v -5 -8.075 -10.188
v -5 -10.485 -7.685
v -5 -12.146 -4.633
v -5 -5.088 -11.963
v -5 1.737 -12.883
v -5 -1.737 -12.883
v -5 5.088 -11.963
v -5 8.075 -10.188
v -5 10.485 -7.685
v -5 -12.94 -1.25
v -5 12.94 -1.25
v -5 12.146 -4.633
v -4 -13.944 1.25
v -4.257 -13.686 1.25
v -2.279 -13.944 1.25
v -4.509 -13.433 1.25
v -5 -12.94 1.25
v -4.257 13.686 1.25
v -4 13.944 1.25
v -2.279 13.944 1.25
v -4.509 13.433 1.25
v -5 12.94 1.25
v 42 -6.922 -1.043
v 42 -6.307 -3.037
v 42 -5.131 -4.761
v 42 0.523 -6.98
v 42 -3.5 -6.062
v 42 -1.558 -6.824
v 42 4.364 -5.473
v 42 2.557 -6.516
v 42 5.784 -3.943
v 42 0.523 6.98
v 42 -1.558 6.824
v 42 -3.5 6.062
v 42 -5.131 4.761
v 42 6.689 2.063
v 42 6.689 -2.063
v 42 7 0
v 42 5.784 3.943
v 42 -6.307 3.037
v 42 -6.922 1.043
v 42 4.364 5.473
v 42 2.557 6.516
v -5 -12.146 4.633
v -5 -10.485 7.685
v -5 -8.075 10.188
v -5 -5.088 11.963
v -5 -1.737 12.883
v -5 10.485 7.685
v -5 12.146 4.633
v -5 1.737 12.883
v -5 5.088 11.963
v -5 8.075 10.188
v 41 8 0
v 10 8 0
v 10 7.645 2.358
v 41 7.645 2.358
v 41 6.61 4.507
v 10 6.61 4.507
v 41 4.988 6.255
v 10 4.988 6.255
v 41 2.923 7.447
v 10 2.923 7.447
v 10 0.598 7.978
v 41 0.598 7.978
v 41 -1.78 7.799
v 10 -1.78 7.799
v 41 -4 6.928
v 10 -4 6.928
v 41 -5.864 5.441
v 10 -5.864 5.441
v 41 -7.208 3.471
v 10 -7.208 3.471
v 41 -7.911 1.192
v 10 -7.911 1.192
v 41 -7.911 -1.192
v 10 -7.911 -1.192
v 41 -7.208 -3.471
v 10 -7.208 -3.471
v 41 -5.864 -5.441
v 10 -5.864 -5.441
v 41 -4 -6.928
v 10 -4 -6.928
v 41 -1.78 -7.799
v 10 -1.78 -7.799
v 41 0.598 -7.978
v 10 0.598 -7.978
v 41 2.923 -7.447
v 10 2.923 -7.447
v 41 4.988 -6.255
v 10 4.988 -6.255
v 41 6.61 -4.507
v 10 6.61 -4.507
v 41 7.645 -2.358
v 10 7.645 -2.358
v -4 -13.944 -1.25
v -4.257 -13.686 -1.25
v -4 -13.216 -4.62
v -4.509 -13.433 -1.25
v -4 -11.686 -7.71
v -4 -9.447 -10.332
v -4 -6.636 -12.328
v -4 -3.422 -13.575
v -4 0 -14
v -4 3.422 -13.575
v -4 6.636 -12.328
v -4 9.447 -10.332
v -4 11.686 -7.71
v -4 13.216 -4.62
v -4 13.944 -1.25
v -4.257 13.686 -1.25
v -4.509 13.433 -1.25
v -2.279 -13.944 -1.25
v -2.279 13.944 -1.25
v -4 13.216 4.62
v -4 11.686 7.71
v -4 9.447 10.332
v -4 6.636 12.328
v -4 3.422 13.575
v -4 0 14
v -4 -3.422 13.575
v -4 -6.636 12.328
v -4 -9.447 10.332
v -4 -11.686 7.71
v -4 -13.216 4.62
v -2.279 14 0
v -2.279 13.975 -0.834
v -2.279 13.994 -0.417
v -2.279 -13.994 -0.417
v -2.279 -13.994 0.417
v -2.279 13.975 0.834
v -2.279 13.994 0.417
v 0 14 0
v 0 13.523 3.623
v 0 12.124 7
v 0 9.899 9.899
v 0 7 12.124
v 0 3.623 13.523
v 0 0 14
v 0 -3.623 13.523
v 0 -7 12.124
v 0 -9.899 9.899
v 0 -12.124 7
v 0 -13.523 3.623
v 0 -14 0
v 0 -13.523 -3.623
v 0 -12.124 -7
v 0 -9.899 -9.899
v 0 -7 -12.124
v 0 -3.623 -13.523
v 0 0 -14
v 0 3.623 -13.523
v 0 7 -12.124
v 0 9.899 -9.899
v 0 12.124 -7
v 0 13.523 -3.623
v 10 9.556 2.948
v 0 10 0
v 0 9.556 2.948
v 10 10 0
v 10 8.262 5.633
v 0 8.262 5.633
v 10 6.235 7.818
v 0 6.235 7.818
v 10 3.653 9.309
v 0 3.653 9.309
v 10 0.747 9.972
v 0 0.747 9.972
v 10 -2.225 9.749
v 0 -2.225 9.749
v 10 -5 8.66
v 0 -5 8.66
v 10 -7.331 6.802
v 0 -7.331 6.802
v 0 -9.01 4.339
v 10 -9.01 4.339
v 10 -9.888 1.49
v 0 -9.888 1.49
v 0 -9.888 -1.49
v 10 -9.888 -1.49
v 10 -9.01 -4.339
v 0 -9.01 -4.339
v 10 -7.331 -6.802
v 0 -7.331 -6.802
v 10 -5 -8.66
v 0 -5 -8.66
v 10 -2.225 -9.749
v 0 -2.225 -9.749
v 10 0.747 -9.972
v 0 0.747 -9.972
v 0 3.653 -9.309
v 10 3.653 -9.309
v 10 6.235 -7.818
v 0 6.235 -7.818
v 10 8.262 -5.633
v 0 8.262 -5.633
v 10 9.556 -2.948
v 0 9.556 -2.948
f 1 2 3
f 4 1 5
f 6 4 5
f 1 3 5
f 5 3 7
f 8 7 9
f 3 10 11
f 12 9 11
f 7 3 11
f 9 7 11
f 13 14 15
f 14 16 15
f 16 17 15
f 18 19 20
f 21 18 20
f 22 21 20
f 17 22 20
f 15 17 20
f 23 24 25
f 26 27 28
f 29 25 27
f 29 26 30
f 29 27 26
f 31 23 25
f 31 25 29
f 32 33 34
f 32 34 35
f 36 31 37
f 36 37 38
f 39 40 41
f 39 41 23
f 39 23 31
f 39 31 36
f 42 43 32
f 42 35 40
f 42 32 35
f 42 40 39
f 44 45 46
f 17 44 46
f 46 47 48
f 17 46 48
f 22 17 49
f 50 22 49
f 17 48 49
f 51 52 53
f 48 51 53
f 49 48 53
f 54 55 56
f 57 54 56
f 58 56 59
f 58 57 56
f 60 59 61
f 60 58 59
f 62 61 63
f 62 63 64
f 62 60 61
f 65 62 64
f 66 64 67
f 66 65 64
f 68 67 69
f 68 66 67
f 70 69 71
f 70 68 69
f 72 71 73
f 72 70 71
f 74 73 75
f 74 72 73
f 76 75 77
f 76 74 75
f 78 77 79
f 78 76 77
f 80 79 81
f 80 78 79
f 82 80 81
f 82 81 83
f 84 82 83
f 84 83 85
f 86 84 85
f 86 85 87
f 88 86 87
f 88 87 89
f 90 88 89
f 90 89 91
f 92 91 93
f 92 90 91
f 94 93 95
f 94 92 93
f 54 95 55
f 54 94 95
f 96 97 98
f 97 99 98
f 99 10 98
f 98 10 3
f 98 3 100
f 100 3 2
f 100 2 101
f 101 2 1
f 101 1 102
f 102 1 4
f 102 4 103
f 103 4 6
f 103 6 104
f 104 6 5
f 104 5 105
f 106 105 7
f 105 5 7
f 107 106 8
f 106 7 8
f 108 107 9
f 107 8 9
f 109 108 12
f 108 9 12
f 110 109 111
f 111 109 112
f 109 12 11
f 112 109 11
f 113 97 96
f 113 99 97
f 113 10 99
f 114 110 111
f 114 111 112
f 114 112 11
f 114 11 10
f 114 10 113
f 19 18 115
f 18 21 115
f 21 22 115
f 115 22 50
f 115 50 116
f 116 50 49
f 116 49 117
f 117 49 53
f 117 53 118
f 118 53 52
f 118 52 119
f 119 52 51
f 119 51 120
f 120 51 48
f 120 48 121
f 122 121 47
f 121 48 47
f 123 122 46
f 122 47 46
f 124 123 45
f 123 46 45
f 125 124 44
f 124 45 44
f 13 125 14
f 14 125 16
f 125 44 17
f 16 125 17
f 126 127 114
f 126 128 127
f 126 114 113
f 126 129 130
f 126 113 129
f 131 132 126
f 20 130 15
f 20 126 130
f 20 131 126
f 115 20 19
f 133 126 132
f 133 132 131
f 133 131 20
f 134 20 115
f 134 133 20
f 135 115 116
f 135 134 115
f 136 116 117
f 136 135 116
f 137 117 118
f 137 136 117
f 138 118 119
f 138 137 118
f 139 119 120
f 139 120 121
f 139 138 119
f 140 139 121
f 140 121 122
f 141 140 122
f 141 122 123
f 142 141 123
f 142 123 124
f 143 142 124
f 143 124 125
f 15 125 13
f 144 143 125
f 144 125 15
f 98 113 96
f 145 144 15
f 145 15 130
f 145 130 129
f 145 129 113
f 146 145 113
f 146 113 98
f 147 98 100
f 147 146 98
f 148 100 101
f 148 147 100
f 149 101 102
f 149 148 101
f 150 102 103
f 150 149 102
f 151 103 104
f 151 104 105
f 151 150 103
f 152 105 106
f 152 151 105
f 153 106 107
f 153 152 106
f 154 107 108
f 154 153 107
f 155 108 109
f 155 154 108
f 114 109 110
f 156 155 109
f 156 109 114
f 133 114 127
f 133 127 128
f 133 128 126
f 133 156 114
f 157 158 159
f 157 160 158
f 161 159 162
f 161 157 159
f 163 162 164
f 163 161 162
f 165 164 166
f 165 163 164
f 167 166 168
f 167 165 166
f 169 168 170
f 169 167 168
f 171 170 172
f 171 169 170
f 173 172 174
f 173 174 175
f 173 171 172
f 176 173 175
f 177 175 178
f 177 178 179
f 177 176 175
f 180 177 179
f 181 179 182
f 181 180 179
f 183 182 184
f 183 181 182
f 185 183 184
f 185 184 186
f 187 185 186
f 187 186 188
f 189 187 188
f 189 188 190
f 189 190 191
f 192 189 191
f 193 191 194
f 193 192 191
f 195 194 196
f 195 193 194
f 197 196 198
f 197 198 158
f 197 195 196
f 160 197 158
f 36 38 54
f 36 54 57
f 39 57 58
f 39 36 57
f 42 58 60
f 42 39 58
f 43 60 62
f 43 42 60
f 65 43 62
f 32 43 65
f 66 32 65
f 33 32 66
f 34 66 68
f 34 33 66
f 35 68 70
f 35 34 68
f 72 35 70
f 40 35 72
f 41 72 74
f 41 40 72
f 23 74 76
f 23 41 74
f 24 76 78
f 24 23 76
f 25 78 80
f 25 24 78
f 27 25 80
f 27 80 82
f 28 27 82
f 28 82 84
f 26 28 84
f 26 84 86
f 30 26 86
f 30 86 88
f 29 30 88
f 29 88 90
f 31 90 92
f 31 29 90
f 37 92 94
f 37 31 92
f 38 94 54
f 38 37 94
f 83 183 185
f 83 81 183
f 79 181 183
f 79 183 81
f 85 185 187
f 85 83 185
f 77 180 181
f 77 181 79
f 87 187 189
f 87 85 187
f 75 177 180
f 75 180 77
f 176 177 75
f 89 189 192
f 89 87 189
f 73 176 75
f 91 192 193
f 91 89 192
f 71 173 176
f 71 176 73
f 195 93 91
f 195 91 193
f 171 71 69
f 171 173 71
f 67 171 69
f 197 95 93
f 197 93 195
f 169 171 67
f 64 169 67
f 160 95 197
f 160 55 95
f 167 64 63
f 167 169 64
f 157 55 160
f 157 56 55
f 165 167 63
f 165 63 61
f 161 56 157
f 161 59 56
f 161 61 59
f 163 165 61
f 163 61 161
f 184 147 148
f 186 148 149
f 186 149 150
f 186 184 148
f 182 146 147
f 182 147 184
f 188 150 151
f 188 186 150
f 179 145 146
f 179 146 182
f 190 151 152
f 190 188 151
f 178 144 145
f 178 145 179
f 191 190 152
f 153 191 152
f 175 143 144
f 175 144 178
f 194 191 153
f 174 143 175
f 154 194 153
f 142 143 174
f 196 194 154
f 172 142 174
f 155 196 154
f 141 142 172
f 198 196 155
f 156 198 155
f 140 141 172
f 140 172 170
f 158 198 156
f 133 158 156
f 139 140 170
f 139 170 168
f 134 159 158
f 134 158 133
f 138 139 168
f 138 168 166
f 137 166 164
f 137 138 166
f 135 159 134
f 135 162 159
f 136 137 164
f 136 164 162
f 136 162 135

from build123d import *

# Parameters (mm, degrees)
F0_R          = 8
F1_DEPTH      = 42
F1_DEPTH_BACK = 5
F0_R_2        = 10
F2_DEPTH      = 10
F2_DEPTH_BACK = 5
F0_R_3        = 14
F3_DEPTH      = 5
F4_SIZE       = 1
F5_W          = 58
F5_H          = 2.5
F6_DEPTH      = 25
F6_DEPTH_BACK = 25


with BuildPart() as f1:
    # F0 (on Right) → F1 (new body, two sides)
    with BuildSketch(Plane.YZ) as f1_sk:
        Circle(F0_R)
    extrude(amount=F1_DEPTH)
    extrude(f1_sk.sketch, amount=-F1_DEPTH_BACK)

    # F0 (on Right) → F2 (join, two sides)
    with BuildSketch(Plane.YZ) as f2_sk:
        Circle(F0_R_2)
        Circle(F0_R, mode=Mode.SUBTRACT)
    extrude(amount=F2_DEPTH)
    extrude(f2_sk.sketch, amount=-F2_DEPTH_BACK)

    # F0 (on Right) → F3 (join)
    with BuildSketch(Plane.YZ):
        Circle(F0_R_3)
        Circle(F0_R_2, mode=Mode.SUBTRACT)
    extrude(amount=-F3_DEPTH)

    # F4
    f4_edges = [f1.edges().sort_by_distance(p)[0] for p in [
        (-5, -14, 0),
        (42, -8, 0),
    ]]
    chamfer(f4_edges, length=F4_SIZE)

    # F5 (on Front) → F6 (cut, two sides)
    with BuildSketch(Plane.XZ) as f6_sk:
        with Locations((-31.278737, 0)):
            Rectangle(F5_W, F5_H)
    extrude(amount=F6_DEPTH, mode=Mode.SUBTRACT)
    extrude(f6_sk.sketch, amount=-F6_DEPTH_BACK, mode=Mode.SUBTRACT)


solid = f1.part
